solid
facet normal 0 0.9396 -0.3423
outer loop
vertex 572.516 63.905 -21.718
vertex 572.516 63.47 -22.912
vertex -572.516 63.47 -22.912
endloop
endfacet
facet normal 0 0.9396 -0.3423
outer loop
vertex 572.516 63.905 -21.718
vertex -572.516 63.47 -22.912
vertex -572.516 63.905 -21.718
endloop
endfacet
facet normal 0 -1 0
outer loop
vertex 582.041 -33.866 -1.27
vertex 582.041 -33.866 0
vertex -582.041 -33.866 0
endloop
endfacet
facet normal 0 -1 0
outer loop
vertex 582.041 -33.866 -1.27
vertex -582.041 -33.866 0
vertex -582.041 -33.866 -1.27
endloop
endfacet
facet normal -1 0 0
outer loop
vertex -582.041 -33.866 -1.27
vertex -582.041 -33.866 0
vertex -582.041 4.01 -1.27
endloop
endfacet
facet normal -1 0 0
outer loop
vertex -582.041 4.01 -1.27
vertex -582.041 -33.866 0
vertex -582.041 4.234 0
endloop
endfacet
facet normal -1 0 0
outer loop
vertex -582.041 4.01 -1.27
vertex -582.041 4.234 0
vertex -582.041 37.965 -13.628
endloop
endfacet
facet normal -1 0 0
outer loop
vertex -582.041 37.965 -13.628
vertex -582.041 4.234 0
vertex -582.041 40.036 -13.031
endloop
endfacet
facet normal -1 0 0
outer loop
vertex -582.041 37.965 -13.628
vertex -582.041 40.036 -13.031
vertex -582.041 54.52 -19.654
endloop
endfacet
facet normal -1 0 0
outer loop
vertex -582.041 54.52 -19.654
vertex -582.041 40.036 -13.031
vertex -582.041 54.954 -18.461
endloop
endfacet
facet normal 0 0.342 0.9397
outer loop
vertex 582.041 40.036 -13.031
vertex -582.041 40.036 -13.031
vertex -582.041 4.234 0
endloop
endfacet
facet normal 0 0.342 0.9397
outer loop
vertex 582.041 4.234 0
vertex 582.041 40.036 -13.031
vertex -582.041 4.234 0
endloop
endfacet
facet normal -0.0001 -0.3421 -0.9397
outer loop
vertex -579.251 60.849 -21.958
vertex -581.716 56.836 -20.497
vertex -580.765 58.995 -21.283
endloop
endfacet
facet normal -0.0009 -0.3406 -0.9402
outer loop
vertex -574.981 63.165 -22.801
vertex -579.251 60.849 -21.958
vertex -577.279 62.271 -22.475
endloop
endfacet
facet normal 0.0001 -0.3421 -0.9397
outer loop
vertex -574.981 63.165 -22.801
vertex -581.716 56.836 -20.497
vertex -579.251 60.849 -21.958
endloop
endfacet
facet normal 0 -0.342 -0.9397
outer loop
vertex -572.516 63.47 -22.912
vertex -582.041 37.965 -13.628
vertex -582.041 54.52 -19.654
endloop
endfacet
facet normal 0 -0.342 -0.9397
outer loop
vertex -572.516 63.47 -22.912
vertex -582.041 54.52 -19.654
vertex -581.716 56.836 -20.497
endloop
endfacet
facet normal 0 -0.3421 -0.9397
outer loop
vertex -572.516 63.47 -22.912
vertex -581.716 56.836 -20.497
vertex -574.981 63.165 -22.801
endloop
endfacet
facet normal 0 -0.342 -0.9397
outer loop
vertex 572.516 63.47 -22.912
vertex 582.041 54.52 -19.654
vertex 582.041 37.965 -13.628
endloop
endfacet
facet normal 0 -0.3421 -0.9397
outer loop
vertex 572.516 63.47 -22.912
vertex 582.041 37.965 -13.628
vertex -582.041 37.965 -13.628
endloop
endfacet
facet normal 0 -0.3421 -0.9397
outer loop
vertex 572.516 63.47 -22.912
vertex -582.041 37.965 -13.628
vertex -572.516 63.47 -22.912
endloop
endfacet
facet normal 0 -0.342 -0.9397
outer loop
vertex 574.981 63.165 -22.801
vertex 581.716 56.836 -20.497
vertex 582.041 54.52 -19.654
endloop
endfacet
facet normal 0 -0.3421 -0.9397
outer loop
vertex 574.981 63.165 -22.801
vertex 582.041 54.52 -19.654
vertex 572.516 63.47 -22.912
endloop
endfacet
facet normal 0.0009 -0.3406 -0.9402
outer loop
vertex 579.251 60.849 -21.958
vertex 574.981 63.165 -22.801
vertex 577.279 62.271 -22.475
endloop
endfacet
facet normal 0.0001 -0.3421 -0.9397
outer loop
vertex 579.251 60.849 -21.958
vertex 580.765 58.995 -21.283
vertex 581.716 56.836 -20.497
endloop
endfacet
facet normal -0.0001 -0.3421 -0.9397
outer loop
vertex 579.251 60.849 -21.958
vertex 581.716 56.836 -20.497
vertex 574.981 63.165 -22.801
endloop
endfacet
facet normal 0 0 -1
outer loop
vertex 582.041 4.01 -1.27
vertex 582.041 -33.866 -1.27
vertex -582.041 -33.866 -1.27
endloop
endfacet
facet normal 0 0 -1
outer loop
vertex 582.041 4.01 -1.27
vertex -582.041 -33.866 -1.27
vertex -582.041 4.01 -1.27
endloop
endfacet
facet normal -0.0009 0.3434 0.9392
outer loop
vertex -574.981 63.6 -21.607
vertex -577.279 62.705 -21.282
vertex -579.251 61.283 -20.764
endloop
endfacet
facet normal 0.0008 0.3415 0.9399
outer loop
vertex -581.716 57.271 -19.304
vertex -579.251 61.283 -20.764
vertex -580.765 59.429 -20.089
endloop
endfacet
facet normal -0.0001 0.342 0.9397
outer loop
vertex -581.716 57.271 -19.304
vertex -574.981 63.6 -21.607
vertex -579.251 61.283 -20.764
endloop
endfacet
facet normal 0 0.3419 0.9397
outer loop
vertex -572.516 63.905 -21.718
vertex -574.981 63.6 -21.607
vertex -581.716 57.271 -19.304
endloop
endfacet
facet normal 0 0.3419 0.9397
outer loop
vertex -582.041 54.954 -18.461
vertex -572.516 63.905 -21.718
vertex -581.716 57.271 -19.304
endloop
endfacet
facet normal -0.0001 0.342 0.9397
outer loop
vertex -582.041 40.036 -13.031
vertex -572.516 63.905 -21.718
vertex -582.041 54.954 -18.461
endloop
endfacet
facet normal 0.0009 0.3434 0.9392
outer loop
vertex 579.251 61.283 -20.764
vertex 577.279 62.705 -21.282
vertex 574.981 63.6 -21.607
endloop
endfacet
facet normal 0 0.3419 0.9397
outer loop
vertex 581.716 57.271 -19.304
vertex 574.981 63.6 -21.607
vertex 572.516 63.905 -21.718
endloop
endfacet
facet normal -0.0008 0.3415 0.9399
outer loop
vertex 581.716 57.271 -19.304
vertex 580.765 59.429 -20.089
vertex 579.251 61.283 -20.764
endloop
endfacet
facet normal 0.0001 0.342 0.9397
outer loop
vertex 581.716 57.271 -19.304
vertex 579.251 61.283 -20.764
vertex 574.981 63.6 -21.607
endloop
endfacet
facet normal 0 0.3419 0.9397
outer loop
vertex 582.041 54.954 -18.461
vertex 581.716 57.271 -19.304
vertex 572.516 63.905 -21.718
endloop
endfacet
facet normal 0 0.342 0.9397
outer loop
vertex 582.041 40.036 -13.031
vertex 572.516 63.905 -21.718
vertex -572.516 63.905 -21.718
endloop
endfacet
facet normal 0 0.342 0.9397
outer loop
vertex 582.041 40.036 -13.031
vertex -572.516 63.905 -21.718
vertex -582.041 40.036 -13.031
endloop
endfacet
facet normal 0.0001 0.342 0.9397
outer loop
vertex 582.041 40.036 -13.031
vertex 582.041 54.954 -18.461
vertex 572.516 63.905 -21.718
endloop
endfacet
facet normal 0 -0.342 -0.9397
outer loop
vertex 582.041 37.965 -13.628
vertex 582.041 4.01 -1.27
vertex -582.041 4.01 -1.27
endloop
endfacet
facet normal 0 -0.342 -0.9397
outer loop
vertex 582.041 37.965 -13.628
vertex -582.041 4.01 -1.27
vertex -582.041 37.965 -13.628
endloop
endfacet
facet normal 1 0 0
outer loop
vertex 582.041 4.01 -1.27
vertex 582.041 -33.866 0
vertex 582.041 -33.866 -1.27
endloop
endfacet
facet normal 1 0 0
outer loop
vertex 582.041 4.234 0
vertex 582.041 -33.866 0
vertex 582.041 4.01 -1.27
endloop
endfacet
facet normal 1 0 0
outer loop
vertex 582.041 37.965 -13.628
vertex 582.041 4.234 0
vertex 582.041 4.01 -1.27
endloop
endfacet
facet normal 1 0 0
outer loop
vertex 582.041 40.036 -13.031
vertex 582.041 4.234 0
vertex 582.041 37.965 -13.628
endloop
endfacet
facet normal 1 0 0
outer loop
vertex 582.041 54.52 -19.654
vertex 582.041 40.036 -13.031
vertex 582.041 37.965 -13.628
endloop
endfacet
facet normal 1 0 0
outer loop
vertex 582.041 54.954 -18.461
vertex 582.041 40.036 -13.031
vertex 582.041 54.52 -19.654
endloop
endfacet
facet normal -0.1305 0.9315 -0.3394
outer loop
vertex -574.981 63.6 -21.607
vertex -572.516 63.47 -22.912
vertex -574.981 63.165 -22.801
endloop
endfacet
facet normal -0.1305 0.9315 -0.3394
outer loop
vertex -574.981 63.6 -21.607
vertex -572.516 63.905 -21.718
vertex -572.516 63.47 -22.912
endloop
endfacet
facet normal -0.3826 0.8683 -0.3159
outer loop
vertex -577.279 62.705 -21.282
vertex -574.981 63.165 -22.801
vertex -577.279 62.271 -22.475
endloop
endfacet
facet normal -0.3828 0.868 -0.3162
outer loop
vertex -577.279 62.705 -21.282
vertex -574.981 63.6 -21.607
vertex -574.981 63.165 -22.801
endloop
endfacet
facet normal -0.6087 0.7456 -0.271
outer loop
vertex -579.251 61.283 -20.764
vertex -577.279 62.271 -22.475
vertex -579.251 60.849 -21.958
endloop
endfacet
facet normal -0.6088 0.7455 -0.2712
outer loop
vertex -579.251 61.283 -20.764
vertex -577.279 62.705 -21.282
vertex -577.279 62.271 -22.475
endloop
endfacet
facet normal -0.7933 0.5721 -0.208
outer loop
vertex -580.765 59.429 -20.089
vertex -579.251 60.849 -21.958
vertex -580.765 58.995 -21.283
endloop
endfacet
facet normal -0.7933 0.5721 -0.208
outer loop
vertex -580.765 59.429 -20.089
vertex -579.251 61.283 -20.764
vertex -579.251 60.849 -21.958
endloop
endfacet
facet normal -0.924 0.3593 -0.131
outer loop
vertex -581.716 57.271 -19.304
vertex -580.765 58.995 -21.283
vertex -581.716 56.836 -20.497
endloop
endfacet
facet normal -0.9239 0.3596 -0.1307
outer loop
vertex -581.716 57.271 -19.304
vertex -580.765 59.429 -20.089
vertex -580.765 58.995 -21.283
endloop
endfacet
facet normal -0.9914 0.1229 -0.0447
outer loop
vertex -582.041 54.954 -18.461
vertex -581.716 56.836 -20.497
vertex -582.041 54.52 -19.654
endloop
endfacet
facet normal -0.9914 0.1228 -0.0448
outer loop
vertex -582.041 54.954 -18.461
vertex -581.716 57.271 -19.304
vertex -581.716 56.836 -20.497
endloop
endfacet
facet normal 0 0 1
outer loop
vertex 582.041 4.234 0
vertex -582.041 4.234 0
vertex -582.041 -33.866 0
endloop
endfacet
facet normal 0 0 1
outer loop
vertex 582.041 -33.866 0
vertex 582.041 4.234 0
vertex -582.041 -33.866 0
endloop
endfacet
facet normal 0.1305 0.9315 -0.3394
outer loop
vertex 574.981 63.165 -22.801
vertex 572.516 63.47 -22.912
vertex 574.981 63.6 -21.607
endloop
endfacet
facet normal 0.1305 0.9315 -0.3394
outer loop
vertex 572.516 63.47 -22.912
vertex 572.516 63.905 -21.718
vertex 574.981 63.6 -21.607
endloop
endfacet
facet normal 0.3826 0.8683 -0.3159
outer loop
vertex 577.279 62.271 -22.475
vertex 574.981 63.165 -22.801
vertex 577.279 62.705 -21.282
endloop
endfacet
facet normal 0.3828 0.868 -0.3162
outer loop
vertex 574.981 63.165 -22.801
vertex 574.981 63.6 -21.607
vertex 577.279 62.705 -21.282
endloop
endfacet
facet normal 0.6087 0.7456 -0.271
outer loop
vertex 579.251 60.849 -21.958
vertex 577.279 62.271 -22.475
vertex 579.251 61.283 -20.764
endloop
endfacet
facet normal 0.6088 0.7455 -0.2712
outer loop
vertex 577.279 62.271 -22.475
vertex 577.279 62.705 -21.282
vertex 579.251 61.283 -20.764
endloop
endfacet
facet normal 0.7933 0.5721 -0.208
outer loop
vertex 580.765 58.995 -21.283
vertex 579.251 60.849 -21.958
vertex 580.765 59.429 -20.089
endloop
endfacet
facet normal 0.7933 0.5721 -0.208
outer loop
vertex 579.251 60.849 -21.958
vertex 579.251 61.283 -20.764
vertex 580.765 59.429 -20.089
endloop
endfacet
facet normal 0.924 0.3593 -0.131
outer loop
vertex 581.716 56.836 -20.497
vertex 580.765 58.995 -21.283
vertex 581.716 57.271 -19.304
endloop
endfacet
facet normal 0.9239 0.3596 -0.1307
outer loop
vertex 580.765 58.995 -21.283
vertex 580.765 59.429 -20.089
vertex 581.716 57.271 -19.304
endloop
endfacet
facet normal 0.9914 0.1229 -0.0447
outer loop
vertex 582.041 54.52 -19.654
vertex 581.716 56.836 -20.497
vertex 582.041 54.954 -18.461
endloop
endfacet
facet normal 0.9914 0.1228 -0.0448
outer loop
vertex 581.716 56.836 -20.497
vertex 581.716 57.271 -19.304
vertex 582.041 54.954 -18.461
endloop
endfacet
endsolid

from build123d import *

# Parameters (mm, degrees)
F1_DEPTH = 582.041
F2_R     = 9.525
F3_R     = 9.525


with BuildPart() as f1:
    # F0 (on Right) → F1 (new body, symmetric)
    with BuildSketch(Plane.YZ):
        Polygon((4.234042, 0), (-33.865958, 0), (-33.865958, -1.27), (4.010107, -1.27), (37.964798, -13.628497), (63.470158, -22.911689), (63.904524, -21.718279), (40.036331, -13.030967), align=None)
    extrude(amount=F1_DEPTH, both=True)

    # F2
    f2_edges = [f1.edges().sort_by_distance(p)[0] for p in [
        (582.041, 63.687341, -22.314984),
    ]]
    fillet(f2_edges, radius=F2_R)

    # F3
    f3_edges = [f1.edges().sort_by_distance(p)[0] for p in [
        (-582.041, 63.687341, -22.314984),
    ]]
    fillet(f3_edges, radius=F3_R)


solid = f1.part
